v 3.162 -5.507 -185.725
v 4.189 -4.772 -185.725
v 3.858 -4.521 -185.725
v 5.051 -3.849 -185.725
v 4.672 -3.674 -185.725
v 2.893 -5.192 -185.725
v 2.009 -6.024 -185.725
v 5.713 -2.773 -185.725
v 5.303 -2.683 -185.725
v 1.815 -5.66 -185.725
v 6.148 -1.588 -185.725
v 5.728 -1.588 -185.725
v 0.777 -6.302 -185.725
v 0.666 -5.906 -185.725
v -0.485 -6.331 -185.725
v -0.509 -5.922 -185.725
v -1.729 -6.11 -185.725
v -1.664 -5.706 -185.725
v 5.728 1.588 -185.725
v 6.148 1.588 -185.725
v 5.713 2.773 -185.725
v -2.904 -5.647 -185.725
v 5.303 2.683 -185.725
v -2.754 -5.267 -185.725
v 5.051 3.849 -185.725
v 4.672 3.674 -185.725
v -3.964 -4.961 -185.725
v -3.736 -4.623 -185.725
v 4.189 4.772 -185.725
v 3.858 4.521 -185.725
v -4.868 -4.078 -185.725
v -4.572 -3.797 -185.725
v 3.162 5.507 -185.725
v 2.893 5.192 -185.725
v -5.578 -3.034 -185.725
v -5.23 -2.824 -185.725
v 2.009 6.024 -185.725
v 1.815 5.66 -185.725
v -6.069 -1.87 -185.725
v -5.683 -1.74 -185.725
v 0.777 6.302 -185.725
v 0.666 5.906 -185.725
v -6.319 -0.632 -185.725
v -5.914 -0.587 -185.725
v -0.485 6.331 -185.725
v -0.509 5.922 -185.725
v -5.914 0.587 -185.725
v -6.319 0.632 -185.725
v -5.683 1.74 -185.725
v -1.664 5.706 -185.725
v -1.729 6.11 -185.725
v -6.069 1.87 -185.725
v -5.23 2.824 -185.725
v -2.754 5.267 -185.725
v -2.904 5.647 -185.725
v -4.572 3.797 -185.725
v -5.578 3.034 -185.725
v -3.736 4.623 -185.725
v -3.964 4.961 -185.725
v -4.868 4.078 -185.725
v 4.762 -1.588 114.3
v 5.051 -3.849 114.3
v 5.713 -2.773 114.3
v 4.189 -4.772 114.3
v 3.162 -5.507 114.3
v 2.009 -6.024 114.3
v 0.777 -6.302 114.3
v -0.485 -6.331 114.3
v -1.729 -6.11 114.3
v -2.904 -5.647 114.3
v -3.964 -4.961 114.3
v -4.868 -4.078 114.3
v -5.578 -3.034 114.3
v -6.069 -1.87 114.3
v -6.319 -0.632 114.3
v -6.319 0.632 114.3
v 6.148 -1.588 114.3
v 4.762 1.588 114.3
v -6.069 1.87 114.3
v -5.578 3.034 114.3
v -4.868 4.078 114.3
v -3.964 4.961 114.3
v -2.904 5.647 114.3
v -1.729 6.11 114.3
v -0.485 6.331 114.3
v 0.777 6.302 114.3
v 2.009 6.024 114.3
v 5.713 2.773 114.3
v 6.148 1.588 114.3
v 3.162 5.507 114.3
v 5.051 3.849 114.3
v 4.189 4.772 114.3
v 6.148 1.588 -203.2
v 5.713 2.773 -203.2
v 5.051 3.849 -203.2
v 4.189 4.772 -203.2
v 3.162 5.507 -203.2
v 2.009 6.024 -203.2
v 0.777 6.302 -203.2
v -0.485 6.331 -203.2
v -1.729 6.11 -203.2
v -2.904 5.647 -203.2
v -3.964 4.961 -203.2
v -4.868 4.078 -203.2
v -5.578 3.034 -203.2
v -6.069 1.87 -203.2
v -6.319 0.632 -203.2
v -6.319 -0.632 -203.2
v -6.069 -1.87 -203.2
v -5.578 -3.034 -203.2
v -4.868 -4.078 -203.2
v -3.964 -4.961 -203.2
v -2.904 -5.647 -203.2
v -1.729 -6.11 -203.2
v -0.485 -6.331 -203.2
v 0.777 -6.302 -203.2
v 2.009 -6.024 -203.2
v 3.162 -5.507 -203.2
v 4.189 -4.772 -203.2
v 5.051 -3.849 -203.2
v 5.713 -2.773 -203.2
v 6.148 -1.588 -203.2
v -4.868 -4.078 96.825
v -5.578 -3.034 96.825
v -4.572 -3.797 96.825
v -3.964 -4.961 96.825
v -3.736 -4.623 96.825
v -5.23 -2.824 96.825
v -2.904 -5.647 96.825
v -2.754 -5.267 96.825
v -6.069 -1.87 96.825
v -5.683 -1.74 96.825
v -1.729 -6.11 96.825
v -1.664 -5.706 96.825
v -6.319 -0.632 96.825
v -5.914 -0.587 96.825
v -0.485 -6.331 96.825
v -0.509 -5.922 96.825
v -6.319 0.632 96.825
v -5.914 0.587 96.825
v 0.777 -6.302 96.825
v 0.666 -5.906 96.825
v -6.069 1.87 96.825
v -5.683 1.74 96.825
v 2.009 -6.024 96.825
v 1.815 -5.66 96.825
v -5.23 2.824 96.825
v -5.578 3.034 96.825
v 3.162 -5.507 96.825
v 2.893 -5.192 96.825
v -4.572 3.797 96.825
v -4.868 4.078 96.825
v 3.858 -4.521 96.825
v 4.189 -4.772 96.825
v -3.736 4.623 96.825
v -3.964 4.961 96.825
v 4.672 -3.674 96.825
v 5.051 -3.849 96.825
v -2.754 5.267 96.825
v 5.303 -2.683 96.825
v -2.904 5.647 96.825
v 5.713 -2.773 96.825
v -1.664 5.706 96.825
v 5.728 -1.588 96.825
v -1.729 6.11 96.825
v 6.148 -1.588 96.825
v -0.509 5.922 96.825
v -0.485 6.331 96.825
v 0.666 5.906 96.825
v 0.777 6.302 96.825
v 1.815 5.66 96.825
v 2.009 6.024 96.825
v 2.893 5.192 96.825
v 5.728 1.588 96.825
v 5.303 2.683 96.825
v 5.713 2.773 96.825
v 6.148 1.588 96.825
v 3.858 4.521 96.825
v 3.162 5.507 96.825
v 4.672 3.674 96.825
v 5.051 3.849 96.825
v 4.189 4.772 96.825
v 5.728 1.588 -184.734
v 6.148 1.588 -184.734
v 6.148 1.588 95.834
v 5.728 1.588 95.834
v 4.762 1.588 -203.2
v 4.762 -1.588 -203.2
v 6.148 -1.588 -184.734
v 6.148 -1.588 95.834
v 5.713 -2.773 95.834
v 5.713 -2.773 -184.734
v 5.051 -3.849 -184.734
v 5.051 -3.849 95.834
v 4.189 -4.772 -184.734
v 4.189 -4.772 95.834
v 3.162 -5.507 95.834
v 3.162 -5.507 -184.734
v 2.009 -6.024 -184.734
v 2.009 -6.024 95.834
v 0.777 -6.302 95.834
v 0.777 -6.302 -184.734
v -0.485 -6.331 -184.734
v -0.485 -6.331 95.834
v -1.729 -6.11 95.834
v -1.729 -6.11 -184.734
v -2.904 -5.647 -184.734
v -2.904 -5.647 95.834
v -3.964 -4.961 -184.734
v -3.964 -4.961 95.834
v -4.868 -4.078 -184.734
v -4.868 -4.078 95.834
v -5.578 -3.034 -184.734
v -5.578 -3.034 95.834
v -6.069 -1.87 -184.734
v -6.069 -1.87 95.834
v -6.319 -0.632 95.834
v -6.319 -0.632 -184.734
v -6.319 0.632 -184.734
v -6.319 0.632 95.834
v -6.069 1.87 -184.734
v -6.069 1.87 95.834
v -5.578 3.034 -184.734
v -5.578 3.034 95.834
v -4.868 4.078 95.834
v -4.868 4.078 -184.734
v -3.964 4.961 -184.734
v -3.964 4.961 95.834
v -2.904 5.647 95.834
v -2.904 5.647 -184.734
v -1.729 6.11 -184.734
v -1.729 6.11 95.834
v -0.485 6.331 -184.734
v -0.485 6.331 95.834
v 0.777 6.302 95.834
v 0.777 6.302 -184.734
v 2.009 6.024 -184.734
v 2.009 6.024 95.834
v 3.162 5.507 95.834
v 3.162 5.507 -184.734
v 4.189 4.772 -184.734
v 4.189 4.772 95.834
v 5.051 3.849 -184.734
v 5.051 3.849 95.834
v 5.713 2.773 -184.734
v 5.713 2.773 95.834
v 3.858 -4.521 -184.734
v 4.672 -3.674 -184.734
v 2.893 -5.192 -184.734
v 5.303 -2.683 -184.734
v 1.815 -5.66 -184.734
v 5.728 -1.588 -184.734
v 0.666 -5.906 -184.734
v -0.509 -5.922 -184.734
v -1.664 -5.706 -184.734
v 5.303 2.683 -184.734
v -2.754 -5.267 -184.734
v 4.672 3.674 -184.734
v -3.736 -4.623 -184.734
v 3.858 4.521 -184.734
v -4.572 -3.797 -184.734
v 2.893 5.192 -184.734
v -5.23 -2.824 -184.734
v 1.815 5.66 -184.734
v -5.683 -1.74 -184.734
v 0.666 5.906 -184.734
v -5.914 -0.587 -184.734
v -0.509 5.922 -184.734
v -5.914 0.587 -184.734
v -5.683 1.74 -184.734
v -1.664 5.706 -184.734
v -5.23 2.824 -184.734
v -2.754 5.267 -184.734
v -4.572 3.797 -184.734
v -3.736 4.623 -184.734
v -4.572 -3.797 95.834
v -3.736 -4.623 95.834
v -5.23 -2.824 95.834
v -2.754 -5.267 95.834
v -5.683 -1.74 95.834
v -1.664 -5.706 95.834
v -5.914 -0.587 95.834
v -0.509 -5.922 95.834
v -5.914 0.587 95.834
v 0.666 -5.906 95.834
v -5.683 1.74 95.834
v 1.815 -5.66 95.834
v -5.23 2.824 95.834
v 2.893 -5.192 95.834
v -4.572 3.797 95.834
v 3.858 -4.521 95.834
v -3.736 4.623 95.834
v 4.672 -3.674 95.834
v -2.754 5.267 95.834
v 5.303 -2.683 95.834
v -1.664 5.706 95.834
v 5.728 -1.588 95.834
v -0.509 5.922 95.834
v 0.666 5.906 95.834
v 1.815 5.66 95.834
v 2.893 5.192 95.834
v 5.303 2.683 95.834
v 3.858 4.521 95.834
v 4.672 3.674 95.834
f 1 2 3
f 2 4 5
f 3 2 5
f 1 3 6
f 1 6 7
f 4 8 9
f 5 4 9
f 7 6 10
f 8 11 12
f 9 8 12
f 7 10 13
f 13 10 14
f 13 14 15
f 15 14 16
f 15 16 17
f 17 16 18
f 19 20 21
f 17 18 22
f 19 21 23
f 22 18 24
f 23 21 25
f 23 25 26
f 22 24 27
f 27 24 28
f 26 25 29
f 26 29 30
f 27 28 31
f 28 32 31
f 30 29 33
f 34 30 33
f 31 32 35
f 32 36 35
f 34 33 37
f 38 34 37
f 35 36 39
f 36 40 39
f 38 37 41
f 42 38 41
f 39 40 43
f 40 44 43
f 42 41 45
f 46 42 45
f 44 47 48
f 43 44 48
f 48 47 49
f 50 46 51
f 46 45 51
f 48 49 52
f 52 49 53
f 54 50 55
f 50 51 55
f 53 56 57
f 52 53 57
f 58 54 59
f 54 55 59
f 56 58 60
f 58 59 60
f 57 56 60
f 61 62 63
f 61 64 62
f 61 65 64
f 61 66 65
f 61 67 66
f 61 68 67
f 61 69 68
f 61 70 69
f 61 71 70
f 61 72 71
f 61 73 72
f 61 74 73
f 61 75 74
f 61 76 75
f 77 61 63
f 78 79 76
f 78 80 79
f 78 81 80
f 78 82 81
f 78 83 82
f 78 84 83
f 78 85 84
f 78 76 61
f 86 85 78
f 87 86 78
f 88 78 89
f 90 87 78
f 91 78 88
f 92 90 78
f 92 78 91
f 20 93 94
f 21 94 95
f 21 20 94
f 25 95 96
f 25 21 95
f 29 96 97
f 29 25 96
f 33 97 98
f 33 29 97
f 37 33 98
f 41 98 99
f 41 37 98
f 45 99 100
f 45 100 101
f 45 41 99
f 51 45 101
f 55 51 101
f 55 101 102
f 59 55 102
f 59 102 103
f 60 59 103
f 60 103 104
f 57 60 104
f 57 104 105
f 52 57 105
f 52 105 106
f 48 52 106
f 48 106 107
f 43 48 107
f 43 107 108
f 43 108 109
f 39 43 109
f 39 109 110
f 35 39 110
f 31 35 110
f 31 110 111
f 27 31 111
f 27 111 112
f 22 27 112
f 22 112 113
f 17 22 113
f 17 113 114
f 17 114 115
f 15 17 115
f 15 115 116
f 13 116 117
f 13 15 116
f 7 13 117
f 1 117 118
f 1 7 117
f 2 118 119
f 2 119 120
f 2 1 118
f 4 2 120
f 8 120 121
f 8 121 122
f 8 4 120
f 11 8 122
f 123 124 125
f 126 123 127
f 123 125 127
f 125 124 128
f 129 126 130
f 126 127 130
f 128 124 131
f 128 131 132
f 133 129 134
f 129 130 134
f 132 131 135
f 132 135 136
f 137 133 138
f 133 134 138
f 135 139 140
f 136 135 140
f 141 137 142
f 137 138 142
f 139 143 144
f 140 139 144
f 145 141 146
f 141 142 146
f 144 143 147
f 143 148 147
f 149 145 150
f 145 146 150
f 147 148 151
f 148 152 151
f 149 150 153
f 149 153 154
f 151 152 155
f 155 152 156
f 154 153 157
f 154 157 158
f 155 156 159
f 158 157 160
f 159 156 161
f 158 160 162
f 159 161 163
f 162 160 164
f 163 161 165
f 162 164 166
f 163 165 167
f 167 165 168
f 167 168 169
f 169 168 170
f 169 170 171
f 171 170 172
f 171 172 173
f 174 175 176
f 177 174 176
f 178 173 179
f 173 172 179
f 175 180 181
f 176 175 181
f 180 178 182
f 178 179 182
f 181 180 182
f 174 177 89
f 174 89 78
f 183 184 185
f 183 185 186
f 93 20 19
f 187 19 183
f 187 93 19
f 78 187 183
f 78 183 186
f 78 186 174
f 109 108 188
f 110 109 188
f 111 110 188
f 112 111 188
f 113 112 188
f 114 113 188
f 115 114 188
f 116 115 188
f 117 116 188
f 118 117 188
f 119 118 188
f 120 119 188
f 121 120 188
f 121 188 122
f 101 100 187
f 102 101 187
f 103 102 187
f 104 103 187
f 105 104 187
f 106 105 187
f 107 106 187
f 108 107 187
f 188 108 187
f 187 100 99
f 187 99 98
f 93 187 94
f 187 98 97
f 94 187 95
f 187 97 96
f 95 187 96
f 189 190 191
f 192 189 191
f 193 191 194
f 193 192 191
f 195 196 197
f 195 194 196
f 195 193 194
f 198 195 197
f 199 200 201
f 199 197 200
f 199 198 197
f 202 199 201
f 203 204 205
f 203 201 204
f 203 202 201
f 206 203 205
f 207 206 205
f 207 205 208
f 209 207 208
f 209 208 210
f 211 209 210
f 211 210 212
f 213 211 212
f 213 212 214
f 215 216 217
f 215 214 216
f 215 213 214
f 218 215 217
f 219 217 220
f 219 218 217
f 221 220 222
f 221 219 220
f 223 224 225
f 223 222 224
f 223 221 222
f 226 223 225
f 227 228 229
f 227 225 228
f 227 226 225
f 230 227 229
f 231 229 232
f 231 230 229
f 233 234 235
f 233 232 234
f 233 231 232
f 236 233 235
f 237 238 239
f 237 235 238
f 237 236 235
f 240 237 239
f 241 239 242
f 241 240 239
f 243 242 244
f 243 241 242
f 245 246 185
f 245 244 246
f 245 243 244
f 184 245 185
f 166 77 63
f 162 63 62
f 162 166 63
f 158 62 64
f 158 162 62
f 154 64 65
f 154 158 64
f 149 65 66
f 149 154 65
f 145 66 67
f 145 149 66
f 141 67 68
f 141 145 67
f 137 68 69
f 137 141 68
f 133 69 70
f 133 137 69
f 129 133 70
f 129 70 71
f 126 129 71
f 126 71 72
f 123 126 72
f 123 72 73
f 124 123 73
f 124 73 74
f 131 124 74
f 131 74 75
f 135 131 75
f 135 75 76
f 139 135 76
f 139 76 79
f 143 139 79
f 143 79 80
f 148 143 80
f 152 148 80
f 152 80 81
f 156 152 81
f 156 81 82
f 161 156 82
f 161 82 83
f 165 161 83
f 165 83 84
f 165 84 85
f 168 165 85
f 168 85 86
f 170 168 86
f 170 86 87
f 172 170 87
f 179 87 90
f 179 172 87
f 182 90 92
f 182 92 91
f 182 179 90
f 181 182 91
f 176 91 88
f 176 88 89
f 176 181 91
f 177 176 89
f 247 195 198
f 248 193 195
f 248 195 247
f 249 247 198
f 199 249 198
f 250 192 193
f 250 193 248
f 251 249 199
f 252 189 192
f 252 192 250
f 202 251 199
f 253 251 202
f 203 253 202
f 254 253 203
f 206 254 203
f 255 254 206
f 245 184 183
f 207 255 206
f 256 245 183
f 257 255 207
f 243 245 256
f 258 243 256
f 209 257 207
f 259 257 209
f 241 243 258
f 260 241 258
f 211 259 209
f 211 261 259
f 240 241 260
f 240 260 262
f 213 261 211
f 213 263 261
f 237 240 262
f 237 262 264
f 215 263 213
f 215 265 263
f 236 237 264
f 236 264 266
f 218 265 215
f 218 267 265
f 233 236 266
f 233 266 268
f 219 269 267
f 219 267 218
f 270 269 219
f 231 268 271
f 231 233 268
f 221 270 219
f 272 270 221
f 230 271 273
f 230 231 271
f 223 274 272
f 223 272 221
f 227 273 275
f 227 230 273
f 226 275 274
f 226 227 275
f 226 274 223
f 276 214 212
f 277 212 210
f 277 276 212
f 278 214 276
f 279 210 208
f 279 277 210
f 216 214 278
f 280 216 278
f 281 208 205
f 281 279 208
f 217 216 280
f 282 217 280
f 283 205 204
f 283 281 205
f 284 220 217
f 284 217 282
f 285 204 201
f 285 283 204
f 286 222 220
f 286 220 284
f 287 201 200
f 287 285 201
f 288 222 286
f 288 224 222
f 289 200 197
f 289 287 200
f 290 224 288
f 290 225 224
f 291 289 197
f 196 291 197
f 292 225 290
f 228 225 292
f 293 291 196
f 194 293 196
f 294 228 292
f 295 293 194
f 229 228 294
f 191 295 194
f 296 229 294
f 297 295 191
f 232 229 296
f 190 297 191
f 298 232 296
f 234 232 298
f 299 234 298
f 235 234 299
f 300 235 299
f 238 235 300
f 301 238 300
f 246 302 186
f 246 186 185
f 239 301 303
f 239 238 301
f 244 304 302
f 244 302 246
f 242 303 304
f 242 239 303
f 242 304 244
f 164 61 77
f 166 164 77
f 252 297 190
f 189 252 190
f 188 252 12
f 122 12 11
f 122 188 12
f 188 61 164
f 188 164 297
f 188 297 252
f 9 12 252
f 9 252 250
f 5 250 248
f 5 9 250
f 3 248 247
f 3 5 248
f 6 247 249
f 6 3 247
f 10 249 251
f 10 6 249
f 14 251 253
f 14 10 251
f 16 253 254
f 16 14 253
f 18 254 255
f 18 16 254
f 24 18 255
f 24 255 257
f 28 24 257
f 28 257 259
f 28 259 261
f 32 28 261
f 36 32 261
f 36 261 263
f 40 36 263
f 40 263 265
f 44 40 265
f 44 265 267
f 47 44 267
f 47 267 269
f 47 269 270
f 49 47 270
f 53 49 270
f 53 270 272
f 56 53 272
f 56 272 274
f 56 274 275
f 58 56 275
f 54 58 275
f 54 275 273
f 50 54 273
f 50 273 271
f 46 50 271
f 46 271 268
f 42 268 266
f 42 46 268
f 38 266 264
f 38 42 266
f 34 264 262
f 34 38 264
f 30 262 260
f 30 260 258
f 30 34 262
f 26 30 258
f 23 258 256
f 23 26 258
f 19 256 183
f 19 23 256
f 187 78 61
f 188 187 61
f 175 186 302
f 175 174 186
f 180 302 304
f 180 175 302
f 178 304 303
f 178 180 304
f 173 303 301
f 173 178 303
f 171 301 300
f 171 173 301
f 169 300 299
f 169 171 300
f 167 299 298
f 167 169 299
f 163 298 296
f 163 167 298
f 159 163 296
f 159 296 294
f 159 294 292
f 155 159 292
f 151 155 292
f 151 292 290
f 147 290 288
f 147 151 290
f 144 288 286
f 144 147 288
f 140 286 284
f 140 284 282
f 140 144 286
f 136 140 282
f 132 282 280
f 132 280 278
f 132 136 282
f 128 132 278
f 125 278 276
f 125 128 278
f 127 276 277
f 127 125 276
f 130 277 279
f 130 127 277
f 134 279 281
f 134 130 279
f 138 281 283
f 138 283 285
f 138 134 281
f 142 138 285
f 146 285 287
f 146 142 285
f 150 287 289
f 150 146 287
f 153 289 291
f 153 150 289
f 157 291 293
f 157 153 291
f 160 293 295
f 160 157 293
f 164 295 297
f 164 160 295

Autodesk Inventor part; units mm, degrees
sketch "Sketch1" plane through (0, 0, 0) normal (0, 0, 1) x (1, 0, 0)
  circle A0 centre (0, 0) radius 6.35
  dimension "d0" = 12.7
extrude "Extrusion1" add sketch "Sketch1" along normal mid plane 406.4
ref_plane "Work Plane1" through (0, 0, 203.2) normal (0, 0, 1) x (1, 0, 0)
ref_plane "Work Plane2" through (0, 0, -185.7248) normal (0, 0, -1) x (-1, 0, 0)
sketch "Sketch2" plane through (0, 0, -185.7248) normal (0, 0, -1) x (-1, 0, 0)
  circle A0 centre (0, 0) radius 5.9436
  circle A1 centre (0, 0) radius 6.35
  dimension "d5" = 11.8872
  dimension "d6" = 12.7
extrude "Extrusion2" cut sketch "Sketch2" against normal blind 0.9906
ref_plane "Work Plane3" through (0, 0, 96.8248) normal (0, 0, 1) x (1, 0, 0)
sketch "Sketch3" plane through (0, 0, 96.8248) normal (0, 0, 1) x (1, 0, 0)
  circle A0 centre (0, 0) radius 6.35
  circle A1 centre (0, 0) radius 5.9436
  dimension "d10" = 12.7
  dimension "d11" = 11.8872
extrude "Extrusion3" cut sketch "Sketch3" against normal blind 0.9906
ref_plane "Work Plane4" through (6.35, 0, 0) normal (1, 0, 0) x (0, 1, 0)
sketch "Sketch5" plane through (0, 0, -203.2) normal (0, 0, -1) x (-1, 0, 0)
  circle A0 centre (0, 0) radius 6.35 projected
sketch "Sketch6" plane through (0, 0, -203.2) normal (0, 0, -1) x (-1, 0, 0)
  circle A0 centre (0, 0) radius 6.35 projected
  line L0 (-4.7625, -1.5875) -> (-7.9375, -1.5875)
  line L1 (-7.9375, -1.5875) -> (-7.9375, 1.5875)
  line L2 (-7.9375, 1.5875) -> (-4.7625, 1.5875)
  line L3 (-4.7625, 1.5875) -> (-4.7625, -1.5875)
  line L4 (-4.7625, -1.5875) -> (-7.9375, 1.5875) construction
  line L5 (-7.9375, -1.5875) -> (-4.7625, 1.5875) construction
  point P0 (-6.35, 0)
  dimension "d19" = 3.175
  dimension "d20" = 3.175
extrude "Extrusion5" cut sketch "Sketch6" against normal blind 406.4 contours L2 L3 L0 A0 | A0 L0 L1 L2 picked at (-5.2842, -0.1781)
ref_plane "Midplane" through (0, 0, -44.45) normal (0, 0, 1) x (1, 0, 0)
sketch "Sketch7" plane through (0, 0, 203.2) normal (0, 0, 1) x (1, 0, 0)
  circle A0 centre (0, 0) radius 11.5682
extrude "Extrusion6" cut sketch "Sketch7" against normal blind 88.9
properties part number "Pin .5in. Dia. - Boom Hinge" material "Stainless Steel"
